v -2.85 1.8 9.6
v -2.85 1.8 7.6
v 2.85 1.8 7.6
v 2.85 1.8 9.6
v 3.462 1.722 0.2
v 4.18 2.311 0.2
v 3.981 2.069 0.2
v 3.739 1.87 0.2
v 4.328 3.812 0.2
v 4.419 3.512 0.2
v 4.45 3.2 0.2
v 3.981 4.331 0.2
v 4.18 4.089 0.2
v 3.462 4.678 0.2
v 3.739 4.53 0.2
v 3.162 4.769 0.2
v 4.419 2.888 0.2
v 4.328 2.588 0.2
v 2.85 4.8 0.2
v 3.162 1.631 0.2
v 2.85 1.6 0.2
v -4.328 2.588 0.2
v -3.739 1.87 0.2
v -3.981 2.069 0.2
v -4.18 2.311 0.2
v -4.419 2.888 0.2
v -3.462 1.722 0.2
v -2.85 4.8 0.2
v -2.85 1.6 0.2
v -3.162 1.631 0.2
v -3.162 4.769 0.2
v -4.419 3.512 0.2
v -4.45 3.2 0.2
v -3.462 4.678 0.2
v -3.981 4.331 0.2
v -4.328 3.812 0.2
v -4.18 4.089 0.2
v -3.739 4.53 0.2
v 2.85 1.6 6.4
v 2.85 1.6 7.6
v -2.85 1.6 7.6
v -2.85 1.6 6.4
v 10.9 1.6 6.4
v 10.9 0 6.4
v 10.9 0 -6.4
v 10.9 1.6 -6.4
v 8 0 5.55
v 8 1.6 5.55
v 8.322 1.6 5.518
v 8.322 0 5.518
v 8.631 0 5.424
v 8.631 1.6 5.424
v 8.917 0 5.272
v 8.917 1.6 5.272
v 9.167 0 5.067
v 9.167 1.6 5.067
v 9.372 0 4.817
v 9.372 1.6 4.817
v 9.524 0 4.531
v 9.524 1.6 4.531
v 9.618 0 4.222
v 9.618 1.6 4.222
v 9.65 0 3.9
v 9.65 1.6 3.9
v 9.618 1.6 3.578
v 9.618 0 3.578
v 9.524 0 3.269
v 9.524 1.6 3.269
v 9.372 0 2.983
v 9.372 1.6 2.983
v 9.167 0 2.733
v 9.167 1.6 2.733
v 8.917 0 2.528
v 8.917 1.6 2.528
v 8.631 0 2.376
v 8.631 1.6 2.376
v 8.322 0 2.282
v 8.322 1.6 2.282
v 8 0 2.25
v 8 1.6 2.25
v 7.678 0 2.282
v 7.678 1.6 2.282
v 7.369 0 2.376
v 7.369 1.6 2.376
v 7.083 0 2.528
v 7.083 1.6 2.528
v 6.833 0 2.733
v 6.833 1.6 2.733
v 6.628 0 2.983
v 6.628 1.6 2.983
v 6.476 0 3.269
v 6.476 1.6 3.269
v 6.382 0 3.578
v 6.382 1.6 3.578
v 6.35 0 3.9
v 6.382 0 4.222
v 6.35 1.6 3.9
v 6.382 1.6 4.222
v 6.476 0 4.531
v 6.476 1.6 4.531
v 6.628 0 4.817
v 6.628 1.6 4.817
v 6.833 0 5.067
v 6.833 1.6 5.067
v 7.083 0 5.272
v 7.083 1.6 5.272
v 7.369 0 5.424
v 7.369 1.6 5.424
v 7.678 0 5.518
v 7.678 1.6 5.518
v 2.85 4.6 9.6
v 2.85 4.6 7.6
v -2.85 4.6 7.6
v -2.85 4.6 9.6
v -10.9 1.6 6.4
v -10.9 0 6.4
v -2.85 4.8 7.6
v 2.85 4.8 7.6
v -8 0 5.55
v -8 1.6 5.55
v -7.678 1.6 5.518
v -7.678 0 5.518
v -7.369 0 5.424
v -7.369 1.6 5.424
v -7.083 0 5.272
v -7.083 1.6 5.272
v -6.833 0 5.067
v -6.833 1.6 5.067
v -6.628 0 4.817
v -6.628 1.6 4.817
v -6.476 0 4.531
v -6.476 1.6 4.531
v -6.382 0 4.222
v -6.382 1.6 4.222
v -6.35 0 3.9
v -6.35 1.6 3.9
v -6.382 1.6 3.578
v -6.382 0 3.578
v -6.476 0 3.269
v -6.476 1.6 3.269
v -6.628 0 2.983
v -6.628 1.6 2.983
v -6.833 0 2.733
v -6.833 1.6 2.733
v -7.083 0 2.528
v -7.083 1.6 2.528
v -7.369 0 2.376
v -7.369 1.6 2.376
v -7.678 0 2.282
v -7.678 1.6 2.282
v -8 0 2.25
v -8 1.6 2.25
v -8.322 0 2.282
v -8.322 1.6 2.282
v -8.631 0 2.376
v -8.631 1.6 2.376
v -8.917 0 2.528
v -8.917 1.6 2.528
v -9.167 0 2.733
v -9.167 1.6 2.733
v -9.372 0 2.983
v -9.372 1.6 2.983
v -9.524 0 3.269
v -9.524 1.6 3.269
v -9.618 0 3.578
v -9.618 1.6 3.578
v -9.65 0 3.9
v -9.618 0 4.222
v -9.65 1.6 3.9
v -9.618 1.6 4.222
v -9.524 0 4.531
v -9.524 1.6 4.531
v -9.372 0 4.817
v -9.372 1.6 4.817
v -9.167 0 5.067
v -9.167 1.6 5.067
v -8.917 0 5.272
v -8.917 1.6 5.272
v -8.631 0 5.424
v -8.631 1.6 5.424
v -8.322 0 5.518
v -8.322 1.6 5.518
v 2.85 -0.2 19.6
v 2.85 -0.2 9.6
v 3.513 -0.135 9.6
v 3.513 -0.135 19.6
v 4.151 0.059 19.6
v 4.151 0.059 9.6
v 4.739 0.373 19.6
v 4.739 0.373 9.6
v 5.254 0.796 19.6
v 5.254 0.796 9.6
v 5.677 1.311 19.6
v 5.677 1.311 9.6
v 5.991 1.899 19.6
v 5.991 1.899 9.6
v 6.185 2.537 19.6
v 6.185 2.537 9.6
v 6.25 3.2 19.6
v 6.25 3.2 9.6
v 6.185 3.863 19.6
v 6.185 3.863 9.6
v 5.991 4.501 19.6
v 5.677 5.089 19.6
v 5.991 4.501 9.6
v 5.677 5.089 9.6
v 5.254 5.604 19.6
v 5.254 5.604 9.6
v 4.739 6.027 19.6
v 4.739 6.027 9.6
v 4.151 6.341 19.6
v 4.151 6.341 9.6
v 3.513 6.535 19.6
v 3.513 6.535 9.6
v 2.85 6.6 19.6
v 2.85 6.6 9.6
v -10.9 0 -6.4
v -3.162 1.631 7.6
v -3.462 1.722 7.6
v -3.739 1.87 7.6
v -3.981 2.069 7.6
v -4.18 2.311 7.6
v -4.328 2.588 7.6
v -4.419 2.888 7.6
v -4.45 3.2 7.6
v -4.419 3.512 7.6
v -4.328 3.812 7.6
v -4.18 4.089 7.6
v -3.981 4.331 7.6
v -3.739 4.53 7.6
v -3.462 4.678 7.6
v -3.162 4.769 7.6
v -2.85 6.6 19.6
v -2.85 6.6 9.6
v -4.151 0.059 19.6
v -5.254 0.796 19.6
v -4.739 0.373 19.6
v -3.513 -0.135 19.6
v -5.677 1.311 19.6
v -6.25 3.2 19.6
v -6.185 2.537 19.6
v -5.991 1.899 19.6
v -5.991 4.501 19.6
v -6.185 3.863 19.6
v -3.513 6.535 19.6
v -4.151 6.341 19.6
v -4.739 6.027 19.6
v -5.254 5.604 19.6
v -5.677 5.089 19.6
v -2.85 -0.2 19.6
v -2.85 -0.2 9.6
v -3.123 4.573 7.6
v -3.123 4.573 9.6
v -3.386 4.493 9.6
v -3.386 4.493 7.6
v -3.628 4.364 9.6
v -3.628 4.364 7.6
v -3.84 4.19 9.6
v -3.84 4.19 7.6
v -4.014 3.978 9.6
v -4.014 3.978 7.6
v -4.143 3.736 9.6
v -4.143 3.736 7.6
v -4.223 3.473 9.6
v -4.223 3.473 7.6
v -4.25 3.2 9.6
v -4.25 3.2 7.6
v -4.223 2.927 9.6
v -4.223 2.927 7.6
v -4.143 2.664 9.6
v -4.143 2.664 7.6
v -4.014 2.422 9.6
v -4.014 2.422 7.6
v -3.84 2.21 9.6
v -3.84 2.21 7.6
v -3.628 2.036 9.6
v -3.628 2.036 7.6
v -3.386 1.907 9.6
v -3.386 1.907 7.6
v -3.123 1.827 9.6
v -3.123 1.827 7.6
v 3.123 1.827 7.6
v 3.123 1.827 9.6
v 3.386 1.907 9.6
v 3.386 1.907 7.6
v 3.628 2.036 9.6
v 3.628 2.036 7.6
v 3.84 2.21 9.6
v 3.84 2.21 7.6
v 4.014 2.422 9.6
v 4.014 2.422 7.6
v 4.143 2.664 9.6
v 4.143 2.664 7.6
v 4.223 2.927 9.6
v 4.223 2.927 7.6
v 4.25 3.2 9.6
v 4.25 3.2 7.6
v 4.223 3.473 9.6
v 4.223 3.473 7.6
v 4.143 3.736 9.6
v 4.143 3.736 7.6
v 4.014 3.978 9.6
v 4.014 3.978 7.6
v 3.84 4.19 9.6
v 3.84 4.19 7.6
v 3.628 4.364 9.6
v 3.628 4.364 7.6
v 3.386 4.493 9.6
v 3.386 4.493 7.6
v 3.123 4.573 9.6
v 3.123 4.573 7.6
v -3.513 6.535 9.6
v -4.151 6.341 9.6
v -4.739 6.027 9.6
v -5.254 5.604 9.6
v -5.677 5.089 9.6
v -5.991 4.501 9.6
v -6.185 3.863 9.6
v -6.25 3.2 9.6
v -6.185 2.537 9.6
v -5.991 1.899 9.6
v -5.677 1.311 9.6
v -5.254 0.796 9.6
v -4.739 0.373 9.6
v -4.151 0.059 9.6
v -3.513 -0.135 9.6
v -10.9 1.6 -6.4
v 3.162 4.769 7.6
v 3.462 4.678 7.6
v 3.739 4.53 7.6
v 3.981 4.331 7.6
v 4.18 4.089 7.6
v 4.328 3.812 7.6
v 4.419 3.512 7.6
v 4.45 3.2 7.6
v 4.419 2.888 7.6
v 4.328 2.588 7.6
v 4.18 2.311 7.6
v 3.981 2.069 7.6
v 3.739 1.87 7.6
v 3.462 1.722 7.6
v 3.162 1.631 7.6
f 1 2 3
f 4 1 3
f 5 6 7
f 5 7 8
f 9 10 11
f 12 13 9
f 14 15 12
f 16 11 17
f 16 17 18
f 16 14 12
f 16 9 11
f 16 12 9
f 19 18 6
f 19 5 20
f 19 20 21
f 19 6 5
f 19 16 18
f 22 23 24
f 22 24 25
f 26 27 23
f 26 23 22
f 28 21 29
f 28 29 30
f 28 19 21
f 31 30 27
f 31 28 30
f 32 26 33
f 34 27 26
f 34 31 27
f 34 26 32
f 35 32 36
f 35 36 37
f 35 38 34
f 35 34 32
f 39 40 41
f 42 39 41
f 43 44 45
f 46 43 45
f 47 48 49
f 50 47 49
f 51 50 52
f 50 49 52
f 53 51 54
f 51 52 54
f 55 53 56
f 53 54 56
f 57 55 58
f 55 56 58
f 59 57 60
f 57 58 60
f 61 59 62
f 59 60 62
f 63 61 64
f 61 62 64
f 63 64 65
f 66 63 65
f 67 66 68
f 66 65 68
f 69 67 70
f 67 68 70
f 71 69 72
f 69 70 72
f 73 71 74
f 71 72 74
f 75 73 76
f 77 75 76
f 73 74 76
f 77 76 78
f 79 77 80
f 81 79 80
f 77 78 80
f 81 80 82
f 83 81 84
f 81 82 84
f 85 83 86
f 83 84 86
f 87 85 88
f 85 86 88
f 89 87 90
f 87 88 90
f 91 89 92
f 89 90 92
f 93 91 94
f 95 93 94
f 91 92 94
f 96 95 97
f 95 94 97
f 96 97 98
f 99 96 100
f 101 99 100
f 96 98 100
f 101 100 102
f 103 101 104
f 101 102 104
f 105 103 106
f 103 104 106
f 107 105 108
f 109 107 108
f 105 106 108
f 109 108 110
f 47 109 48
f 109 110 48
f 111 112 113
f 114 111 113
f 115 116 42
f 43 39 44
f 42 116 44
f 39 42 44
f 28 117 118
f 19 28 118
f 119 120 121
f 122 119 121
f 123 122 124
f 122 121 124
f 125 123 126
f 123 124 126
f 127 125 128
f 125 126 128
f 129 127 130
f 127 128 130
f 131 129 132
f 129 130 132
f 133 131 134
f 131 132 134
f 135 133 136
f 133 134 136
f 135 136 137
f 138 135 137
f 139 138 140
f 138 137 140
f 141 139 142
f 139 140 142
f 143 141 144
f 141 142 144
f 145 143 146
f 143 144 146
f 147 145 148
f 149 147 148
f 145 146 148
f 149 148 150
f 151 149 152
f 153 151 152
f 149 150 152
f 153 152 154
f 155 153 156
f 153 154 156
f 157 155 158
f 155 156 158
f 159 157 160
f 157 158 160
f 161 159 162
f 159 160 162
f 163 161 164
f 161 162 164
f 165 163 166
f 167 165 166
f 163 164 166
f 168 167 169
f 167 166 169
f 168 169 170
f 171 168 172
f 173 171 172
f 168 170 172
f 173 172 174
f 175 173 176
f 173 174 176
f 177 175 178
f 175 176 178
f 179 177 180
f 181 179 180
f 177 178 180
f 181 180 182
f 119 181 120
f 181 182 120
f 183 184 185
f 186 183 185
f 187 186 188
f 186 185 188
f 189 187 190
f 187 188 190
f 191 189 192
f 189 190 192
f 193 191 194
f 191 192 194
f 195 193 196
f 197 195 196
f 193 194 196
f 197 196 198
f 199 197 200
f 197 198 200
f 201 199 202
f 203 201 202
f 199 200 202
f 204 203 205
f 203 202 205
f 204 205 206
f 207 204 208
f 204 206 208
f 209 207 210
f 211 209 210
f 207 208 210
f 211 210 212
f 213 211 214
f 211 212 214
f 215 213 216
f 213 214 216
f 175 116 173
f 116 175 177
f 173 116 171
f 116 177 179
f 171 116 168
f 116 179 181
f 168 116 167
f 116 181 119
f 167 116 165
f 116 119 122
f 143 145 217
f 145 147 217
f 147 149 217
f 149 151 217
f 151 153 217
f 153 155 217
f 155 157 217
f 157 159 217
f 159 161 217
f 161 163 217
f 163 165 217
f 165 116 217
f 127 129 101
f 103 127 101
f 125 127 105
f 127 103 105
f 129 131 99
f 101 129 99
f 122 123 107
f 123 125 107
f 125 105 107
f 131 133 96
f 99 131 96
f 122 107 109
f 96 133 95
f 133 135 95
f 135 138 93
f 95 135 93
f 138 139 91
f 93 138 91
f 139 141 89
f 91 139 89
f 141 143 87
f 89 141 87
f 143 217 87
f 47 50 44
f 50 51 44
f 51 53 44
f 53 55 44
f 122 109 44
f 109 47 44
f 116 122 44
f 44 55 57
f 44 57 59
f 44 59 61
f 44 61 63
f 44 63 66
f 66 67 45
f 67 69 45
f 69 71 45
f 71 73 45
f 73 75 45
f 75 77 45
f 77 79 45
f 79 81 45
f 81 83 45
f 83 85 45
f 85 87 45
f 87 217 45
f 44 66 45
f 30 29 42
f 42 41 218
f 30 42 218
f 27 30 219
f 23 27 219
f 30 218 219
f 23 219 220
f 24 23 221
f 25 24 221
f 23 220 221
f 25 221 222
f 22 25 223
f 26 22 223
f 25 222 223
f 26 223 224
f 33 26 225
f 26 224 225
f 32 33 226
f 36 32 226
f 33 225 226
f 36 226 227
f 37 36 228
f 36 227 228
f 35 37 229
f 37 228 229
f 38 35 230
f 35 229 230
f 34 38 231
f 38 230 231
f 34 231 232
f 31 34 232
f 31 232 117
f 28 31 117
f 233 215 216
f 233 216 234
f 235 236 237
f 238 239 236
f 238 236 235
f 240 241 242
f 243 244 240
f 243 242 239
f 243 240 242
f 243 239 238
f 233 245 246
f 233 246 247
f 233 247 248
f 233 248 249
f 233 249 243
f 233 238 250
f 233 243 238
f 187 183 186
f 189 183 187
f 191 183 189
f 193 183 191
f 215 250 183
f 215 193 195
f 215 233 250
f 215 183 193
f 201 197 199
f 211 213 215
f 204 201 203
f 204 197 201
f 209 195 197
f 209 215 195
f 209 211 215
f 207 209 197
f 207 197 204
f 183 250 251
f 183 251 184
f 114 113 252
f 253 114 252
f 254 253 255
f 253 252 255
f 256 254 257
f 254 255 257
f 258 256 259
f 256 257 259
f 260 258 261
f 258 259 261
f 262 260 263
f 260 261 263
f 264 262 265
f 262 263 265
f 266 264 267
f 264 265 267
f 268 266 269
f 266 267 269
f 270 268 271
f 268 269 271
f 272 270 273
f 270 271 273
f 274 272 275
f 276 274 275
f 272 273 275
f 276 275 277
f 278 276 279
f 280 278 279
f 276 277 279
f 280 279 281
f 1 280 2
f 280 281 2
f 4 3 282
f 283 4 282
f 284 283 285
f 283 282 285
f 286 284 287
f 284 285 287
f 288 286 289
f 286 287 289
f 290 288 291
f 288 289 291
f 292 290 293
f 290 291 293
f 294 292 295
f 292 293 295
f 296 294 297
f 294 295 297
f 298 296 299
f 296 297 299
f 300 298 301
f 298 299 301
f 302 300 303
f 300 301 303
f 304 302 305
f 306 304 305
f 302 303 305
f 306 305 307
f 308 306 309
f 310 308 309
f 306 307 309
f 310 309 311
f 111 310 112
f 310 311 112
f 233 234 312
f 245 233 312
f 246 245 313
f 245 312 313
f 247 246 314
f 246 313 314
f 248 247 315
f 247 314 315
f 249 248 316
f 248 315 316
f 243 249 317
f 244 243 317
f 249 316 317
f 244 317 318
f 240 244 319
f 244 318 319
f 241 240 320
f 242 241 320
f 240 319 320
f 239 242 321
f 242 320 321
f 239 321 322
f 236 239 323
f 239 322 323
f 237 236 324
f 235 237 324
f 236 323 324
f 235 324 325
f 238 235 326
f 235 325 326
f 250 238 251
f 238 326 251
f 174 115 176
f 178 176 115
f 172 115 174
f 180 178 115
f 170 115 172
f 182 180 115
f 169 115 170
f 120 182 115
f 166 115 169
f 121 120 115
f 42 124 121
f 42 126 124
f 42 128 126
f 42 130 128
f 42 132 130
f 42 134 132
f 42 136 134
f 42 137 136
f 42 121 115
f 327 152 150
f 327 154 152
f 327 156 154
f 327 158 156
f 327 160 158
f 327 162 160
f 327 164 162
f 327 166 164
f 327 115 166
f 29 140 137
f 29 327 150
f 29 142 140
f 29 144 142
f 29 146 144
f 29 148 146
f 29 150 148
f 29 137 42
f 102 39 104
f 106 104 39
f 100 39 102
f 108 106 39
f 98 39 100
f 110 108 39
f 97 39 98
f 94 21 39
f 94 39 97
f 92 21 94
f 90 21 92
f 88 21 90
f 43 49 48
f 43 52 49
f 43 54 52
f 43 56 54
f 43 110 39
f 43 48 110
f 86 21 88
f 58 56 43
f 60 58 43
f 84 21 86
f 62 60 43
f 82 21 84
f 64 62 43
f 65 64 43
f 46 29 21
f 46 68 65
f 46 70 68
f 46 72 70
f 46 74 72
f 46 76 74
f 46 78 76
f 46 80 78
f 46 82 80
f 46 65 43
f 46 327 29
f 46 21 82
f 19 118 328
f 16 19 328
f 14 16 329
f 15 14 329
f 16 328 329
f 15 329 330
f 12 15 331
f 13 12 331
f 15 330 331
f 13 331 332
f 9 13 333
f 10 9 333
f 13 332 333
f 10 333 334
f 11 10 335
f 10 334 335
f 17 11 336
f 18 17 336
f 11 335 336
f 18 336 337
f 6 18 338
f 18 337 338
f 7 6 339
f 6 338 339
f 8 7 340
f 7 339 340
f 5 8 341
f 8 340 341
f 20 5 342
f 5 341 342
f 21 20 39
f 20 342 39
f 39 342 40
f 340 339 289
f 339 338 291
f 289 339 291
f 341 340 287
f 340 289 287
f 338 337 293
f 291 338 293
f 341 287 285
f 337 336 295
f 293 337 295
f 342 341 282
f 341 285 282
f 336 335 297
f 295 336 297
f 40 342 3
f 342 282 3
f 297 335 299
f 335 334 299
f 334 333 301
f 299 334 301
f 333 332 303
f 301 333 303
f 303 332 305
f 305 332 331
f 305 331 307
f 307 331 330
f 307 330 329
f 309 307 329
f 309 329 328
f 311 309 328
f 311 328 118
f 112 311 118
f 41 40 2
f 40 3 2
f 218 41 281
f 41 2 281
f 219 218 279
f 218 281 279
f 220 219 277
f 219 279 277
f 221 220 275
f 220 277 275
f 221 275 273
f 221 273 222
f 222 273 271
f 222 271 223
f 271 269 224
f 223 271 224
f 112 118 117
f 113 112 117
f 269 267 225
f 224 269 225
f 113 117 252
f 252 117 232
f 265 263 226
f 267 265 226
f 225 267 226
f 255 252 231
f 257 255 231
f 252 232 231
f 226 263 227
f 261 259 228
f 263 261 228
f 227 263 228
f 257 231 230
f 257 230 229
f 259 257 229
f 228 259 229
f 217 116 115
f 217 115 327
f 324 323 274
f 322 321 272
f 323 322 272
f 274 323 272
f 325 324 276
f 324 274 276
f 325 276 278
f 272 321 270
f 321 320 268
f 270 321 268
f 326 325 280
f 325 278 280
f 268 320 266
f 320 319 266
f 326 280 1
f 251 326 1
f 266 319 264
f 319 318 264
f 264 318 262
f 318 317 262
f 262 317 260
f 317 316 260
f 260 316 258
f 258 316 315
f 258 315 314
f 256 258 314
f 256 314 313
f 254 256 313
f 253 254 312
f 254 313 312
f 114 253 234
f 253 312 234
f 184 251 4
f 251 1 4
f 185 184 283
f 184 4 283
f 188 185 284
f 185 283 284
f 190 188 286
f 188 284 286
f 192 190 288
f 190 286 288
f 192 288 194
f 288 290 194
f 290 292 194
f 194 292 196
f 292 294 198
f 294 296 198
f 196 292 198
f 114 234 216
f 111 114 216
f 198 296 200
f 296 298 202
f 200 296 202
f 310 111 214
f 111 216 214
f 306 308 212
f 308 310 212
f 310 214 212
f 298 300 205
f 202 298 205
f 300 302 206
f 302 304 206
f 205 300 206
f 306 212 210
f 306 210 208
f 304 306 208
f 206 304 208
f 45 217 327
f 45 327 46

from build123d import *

# Parameters (mm, degrees)
SKETCH1_W           = 21.8
SKETCH1_H           = 12.8
BOSS_EXTRUDE1_DEPTH = 1.6
SKETCH2_R           = 1.65
CUT_EXTRUDE1_DEPTH  = 1.6
BOSS_EXTRUDE2_DEPTH = 7.4
BOSS_EXTRUDE3_DEPTH = 2
BOSS_EXTRUDE4_DEPTH = 10


with BuildPart() as part:
    # Sketch1 → Boss-Extrude1 (new body)
    with BuildSketch(Plane(origin=(0, 0, 0), x_dir=(1, 0, 0), z_dir=(0, 1, 0))):
        Rectangle(SKETCH1_W, SKETCH1_H)
    extrude(amount=BOSS_EXTRUDE1_DEPTH)

    # Sketch2 → Cut-Extrude1 (cut)
    with BuildSketch(Plane(origin=(0, 1.6, 0), x_dir=(1, 0, 0), z_dir=(0, 1, 0))):
        with Locations(Location((-8, -3.9, 0), (0, 0, 270))):
            Circle(SKETCH2_R)
        with Locations(Location((8, -3.9, 0), (0, 0, 270))):
            Circle(SKETCH2_R)
    extrude(amount=-CUT_EXTRUDE1_DEPTH, mode=Mode.SUBTRACT)

    # Sketch3 → Boss-Extrude2 (add)
    with BuildSketch(Plane.XY.offset(7.6)):
        with BuildLine():
            Line((-2.85, 4.8), (2.85, 4.8))
            ThreePointArc((2.85, 4.8), (4.45, 3.2), (2.85, 1.6))
            Line((2.85, 1.6), (-2.85, 1.6))
            ThreePointArc((-2.85, 1.6), (-4.45, 3.2), (-2.85, 4.8))
        make_face()
    extrude(amount=-BOSS_EXTRUDE2_DEPTH)

    # Sketch4 → Boss-Extrude3 (add)
    with BuildSketch(Plane.XY.offset(7.6)):
        with BuildLine():
            Line((-2.85, 1.8), (2.85, 1.8))
            ThreePointArc((2.85, 1.8), (4.25, 3.2), (2.85, 4.6))
            Line((2.85, 4.6), (-2.85, 4.6))
            ThreePointArc((-2.85, 4.6), (-4.25, 3.2), (-2.85, 1.8))
        make_face()
    extrude(amount=BOSS_EXTRUDE3_DEPTH)

    # Sketch5 → Boss-Extrude4 (add)
    with BuildSketch(Plane.XY.offset(9.6)):
        with BuildLine():
            Line((-2.85, -0.2), (2.85, -0.2))
            ThreePointArc((2.85, -0.2), (6.25, 3.2), (2.85, 6.6))
            Line((2.85, 6.6), (-2.85, 6.6))
            ThreePointArc((-2.85, 6.6), (-6.25, 3.2), (-2.85, -0.2))
        make_face()
    extrude(amount=BOSS_EXTRUDE4_DEPTH)


solid = part.part
